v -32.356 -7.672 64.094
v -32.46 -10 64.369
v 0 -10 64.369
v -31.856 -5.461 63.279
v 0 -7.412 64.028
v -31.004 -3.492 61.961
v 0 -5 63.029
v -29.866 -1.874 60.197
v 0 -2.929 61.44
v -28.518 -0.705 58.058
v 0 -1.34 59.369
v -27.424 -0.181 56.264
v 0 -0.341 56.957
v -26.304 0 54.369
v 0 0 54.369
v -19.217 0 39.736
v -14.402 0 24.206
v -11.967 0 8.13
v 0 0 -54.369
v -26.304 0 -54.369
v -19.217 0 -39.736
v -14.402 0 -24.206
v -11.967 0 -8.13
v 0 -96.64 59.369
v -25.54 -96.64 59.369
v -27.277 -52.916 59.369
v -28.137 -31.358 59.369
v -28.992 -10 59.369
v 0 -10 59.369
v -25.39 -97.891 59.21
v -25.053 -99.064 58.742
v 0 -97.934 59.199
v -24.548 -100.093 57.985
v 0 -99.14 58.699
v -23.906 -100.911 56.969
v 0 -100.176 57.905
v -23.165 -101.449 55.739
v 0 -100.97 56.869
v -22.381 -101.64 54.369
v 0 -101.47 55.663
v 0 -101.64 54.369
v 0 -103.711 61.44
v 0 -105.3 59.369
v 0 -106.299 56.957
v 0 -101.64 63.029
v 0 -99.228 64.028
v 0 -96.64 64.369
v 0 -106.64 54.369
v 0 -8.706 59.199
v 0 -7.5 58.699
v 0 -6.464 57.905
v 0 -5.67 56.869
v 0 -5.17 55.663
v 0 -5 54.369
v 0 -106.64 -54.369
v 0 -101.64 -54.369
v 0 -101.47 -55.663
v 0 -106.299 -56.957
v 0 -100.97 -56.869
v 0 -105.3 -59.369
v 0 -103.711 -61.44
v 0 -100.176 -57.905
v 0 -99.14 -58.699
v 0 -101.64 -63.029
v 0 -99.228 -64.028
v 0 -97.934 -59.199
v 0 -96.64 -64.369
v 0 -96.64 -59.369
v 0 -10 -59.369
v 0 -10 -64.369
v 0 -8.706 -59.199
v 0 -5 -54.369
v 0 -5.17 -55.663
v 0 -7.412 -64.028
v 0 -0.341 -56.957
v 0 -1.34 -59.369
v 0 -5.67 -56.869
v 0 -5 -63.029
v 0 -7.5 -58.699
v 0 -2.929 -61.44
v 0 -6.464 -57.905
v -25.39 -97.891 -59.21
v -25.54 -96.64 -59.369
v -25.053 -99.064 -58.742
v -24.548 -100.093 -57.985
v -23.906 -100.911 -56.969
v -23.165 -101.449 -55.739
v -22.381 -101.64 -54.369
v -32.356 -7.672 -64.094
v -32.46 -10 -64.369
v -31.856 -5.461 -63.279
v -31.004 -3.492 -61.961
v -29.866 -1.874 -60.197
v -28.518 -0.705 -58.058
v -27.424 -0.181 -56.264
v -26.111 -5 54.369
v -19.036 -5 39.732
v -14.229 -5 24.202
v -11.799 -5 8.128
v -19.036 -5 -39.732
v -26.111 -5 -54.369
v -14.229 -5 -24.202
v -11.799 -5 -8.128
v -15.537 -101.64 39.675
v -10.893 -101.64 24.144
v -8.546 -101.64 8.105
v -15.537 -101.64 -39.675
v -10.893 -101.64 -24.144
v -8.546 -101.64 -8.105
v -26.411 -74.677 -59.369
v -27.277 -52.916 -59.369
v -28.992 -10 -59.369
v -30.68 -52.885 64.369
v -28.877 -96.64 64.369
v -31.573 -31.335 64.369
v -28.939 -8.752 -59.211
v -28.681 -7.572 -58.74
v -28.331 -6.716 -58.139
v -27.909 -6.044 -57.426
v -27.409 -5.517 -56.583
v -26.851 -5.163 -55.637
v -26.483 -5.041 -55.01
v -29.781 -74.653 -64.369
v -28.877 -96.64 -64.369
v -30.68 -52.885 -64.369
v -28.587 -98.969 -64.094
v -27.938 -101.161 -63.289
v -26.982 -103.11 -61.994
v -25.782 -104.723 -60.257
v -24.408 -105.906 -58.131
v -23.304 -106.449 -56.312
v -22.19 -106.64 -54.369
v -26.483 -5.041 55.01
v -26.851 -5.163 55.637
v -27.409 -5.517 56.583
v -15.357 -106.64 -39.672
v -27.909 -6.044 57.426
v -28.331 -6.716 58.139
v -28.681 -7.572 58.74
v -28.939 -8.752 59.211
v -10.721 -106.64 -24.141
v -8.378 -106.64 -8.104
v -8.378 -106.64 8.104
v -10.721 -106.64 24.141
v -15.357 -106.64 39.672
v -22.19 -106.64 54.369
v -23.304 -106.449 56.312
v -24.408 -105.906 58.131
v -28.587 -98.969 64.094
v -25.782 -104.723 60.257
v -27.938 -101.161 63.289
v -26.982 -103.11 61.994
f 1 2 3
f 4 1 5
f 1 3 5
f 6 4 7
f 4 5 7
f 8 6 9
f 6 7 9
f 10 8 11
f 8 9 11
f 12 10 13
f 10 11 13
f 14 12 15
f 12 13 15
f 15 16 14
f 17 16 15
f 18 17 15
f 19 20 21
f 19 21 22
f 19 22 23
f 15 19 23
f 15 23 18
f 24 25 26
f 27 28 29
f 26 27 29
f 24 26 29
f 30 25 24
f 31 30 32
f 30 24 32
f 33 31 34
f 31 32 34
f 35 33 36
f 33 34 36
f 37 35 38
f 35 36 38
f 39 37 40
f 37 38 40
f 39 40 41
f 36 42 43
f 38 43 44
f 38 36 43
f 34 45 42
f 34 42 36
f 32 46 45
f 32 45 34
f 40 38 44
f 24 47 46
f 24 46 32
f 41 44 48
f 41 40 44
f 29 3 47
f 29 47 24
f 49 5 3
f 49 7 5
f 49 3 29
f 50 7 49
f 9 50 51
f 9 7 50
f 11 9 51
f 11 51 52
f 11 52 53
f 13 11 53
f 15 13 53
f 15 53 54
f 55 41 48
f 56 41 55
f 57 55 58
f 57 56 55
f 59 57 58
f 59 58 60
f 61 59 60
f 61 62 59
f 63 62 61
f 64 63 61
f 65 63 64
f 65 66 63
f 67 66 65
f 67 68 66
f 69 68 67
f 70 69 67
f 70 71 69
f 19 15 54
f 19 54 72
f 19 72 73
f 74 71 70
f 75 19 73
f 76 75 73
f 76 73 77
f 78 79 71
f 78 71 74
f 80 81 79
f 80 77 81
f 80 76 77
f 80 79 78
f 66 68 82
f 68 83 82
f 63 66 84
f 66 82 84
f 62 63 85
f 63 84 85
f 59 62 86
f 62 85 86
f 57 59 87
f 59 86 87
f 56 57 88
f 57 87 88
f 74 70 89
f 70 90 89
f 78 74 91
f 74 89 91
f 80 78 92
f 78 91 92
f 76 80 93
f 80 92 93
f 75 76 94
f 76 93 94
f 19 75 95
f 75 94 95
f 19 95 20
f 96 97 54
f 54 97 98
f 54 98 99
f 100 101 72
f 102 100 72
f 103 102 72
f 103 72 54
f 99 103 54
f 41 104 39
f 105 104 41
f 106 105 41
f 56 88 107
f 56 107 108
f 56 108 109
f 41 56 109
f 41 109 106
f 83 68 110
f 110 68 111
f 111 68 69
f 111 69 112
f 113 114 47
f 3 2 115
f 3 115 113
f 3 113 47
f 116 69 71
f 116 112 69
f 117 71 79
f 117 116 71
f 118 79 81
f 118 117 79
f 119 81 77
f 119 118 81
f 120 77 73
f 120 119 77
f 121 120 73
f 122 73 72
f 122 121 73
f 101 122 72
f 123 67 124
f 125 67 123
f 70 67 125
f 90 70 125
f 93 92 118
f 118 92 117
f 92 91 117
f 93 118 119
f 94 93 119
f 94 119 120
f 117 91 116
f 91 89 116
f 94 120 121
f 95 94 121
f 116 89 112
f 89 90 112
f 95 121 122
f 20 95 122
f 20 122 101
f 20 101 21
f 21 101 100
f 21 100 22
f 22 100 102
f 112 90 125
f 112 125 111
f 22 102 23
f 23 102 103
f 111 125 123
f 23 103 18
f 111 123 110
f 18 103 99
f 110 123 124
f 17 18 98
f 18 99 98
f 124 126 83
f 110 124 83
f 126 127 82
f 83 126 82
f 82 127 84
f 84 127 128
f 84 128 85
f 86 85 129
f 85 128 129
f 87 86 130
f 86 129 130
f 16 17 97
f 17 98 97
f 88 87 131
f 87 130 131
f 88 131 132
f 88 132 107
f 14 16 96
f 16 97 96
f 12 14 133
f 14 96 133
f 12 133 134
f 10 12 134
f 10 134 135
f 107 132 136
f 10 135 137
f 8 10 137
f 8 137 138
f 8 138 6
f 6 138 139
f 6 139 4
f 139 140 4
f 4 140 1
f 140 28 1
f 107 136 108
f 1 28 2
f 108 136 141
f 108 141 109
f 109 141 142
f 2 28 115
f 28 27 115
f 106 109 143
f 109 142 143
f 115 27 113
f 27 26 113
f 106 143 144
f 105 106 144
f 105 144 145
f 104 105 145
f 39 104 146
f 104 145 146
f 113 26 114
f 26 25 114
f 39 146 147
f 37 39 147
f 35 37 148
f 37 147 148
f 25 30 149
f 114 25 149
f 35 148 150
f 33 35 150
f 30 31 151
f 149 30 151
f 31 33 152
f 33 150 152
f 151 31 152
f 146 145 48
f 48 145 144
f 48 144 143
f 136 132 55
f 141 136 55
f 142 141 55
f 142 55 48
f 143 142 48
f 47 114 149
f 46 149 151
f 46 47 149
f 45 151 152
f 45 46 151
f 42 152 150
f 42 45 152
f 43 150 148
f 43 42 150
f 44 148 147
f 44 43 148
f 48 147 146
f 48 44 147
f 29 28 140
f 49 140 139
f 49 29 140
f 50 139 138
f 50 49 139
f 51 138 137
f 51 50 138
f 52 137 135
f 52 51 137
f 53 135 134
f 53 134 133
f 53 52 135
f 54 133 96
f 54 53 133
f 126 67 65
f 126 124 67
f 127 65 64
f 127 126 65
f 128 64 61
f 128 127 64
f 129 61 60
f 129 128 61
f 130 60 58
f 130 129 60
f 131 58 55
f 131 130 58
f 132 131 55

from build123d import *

# Parameters (mm, degrees)
BOSS_EXTRUDE1_DEPTH = 106.64
FILLET1_R           = 10
SHELL1_T            = -5


with BuildPart() as part:
    # Sketch1 → Boss-Extrude1 (new body)
    with BuildSketch(Plane(origin=(0, 0, 0), x_dir=(1, 0, 0), z_dir=(0, 1, 0))):
        Polygon((1.515e-14, 64.36916415), (-58.4134595853381, 64.36916415000002), (-58.4134595853381, -64.36916415000002), (1.515e-14, -64.36916415), align=None)
    extrude(amount=-BOSS_EXTRUDE1_DEPTH)

    # Sketch2 → Cut-Revolve1 (revolve, cut)
    with BuildSketch(Plane.XY):
        Polygon((-11.66115202408946, 0), (-8.083701414949179, -106.64), (-119.91640215317999, -106.64), (-119.91640215318, 0), align=None)
    revolve(axis=Axis((-119.91640215318, 0, 0), (1.3e-16, -1, 0)), mode=Mode.SUBTRACT)

    # Fillet1
    fillet1_edges = [part.edges().sort_by_distance(p)[0] for p in [
        (-14.233033878872398, -106.64, 64.36916415),
        (-14.233033878872396, -106.64, -64.36916415),
        (-16.438636834910113, 0, 64.36916415),
        (-16.43863683491015, 0, -64.36916415),
    ]]
    fillet(fillet1_edges, radius=FILLET1_R)

    # Shell1
    shell1_openings = [part.faces().sort_by_distance(p)[0] for p in [
        (-9.87242672, -53.32, 0),
        (0, -53.32, 0),
    ]]
    offset(amount=SHELL1_T, openings=shell1_openings)


solid = part.part
